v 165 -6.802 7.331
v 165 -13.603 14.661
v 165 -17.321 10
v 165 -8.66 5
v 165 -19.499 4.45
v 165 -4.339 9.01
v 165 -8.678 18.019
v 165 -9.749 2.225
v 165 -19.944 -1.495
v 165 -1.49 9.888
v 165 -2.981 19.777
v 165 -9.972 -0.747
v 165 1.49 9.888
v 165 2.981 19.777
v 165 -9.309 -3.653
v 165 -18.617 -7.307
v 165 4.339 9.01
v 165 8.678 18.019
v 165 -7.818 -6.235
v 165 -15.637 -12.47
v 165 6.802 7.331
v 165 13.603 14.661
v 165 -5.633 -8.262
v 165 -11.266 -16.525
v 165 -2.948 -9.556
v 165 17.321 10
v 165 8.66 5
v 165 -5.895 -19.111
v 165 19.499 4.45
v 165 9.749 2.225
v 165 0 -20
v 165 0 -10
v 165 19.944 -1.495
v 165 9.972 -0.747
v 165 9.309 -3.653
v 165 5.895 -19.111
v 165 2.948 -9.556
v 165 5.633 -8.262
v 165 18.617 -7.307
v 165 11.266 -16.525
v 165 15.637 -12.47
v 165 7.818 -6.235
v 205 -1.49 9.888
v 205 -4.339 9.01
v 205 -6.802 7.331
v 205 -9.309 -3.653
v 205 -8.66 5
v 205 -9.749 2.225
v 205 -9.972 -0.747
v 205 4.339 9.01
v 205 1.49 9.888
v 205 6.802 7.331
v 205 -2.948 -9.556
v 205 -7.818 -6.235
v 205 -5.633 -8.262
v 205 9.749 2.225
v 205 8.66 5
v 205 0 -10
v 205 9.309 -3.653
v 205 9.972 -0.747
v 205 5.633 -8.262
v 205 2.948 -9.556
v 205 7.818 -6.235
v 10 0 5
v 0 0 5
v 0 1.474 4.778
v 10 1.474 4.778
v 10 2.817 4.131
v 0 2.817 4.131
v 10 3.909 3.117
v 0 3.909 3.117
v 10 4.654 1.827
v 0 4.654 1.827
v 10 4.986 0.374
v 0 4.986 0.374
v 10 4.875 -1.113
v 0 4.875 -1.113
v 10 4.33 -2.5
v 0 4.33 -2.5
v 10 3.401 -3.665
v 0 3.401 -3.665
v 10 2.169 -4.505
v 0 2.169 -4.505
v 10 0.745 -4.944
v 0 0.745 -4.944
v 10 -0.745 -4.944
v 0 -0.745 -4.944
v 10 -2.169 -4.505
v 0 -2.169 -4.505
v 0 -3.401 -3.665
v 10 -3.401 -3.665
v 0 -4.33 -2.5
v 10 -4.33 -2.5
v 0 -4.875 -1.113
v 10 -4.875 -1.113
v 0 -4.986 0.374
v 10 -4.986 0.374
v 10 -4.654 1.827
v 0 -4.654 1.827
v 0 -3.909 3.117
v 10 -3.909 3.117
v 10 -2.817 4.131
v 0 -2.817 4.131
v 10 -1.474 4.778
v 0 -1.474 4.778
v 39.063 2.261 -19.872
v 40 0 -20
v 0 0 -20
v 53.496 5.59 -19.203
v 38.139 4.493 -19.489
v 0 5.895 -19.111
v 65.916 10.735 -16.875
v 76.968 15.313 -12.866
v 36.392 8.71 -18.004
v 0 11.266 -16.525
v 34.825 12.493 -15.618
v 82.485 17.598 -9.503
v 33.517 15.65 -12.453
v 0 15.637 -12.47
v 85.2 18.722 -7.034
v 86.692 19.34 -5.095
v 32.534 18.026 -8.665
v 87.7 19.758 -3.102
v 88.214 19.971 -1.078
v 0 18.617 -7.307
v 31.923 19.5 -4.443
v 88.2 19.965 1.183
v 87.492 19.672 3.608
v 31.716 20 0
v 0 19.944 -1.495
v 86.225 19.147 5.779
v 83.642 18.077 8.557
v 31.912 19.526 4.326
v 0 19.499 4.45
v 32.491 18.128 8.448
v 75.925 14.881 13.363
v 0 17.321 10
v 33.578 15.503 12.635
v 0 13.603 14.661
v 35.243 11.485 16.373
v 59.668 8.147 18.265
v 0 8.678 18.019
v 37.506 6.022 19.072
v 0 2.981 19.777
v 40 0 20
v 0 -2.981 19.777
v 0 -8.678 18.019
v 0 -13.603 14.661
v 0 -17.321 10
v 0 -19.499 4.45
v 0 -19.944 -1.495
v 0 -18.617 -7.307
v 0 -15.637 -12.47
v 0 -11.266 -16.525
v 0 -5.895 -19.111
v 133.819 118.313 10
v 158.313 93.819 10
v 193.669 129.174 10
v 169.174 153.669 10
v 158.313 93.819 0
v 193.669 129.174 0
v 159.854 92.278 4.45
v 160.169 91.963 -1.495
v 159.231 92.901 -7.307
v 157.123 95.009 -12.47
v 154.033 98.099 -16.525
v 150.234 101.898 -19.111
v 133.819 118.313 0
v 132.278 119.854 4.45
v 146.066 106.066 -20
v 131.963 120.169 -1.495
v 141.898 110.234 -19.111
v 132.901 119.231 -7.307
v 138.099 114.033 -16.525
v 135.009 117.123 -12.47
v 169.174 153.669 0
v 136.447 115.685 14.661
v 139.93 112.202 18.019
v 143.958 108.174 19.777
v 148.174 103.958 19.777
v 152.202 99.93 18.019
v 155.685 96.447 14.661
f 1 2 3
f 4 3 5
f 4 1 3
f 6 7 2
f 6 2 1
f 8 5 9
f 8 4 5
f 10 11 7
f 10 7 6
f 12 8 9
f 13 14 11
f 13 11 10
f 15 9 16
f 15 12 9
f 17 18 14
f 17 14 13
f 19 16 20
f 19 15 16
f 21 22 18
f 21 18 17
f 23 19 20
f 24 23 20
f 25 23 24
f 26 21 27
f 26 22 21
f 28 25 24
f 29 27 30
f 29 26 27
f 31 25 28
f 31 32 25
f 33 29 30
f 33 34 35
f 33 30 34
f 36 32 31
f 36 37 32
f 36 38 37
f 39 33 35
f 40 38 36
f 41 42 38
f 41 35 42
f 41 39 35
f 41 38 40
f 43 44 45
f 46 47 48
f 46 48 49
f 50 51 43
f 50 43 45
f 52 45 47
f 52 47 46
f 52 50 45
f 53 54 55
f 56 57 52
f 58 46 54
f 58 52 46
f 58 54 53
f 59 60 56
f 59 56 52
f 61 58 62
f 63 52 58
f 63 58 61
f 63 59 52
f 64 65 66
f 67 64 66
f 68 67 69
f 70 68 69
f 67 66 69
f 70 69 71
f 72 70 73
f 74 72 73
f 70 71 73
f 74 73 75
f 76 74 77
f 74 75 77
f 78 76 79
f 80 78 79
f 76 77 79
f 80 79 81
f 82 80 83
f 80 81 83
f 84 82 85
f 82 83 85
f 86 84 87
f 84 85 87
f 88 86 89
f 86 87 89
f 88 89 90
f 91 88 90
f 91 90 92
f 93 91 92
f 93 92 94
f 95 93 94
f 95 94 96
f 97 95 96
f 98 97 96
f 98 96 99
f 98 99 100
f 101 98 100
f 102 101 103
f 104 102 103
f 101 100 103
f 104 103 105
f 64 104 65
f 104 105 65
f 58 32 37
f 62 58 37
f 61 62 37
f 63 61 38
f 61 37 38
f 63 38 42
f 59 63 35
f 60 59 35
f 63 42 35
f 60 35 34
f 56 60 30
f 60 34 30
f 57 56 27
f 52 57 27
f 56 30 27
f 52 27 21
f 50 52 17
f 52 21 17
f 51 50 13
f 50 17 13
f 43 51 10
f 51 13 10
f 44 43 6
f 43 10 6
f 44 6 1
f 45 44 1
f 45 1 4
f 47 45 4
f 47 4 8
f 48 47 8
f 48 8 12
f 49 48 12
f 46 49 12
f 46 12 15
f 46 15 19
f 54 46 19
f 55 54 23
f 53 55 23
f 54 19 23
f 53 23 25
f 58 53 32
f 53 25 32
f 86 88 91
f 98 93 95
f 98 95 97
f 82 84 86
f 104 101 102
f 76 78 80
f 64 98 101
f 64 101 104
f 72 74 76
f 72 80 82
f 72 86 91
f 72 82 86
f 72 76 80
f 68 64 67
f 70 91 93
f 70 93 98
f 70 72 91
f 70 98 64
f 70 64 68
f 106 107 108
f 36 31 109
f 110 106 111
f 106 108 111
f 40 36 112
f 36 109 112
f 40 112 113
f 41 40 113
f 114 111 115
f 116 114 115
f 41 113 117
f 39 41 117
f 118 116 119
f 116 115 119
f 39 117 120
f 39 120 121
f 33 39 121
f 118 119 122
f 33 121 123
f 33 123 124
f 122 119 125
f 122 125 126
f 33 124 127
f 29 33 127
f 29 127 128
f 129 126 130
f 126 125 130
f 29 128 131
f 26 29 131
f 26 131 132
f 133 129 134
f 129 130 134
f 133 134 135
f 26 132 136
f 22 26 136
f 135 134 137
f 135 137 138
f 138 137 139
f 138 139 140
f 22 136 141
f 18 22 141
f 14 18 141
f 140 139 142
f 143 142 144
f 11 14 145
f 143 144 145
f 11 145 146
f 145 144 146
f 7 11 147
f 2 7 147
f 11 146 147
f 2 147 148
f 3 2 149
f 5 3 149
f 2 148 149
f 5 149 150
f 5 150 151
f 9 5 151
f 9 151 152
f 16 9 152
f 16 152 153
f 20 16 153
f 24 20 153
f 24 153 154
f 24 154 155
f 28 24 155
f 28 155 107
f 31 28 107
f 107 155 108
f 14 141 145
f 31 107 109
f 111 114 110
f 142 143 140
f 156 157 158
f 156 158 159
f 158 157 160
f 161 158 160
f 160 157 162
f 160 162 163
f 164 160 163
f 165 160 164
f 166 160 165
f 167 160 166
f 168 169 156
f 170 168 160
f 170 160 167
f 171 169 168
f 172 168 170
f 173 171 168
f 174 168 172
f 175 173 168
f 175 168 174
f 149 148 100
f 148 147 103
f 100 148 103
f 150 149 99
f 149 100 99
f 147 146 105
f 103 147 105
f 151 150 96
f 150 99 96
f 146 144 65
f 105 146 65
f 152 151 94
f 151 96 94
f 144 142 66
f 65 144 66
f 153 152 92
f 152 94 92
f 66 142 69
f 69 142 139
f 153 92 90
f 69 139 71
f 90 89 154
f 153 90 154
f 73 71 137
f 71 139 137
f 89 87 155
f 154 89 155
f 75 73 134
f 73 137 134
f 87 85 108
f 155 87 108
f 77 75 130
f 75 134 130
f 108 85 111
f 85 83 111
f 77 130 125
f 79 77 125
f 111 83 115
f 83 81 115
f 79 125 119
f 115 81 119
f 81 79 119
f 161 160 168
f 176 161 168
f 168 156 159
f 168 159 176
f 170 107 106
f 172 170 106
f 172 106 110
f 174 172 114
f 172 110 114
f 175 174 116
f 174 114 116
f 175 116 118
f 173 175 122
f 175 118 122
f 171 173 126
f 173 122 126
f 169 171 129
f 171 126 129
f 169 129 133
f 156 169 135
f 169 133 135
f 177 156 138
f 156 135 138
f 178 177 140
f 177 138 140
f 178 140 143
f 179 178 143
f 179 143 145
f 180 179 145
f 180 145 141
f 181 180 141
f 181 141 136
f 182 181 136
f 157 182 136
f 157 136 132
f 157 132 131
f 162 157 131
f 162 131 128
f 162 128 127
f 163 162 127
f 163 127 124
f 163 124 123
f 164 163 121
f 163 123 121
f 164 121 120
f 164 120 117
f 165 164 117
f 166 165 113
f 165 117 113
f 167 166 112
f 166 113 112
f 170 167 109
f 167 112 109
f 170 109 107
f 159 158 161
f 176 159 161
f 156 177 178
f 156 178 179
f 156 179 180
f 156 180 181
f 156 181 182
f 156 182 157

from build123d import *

# Parameters (mm, degrees)
SKETCH1_R           = 20
BOSS_EXTRUDE1_DEPTH = 165
SKETCH2_R           = 10
BOSS_EXTRUDE2_DEPTH = 40
SKETCH5_R           = 20
BOSS_EXTRUDE3_DEPTH = 150
SKETCH6_W           = 10
SKETCH6_H           = 34.641016151
BOSS_EXTRUDE5_DEPTH = 50
SKETCH7_R           = 5
CUT_EXTRUDE1_DEPTH  = 10


with BuildPart() as part:
    # Sketch1 → Boss-Extrude1 (new body)
    with BuildSketch(Plane(origin=(0, 0, 0), x_dir=(0, 0, -1), z_dir=(1, 0, 0))):
        Circle(SKETCH1_R)
    extrude(amount=BOSS_EXTRUDE1_DEPTH)

    # Sketch2 → Boss-Extrude2 (add)
    with BuildSketch(Plane(origin=(165, 0, 0), x_dir=(0, 0, -1), z_dir=(1, 0, 0))):
        Circle(SKETCH2_R)
    extrude(amount=BOSS_EXTRUDE2_DEPTH)

    # Sketch5 → Boss-Extrude3 (add)
    with BuildSketch(Plane(origin=(20, 20, 0), x_dir=(0.7071067811865464, -0.7071067811865488, 0), z_dir=(0.7071067811865488, 0.7071067811865464, 0))):
        with Locations(Location((28.284271247, 0, 0), (0, 0, 90))):
            Circle(SKETCH5_R)
    extrude(amount=BOSS_EXTRUDE3_DEPTH)

    # Sketch6 → Boss-Extrude5 (add)
    with BuildSketch(Plane(origin=(126.066017178, 126.066017178, 0), x_dir=(0, 0, -1), z_dir=(0.7071067811865487, 0.7071067811865465, 0))):
        with Locations((-5, -28.284271248)):
            Rectangle(SKETCH6_W, SKETCH6_H)
    extrude(amount=BOSS_EXTRUDE5_DEPTH)

    # Sketch7 → Cut-Extrude1 (cut)
    with BuildSketch(Plane.ZY):
        Circle(SKETCH7_R)
    extrude(amount=-CUT_EXTRUDE1_DEPTH, mode=Mode.SUBTRACT)


solid = part.part
